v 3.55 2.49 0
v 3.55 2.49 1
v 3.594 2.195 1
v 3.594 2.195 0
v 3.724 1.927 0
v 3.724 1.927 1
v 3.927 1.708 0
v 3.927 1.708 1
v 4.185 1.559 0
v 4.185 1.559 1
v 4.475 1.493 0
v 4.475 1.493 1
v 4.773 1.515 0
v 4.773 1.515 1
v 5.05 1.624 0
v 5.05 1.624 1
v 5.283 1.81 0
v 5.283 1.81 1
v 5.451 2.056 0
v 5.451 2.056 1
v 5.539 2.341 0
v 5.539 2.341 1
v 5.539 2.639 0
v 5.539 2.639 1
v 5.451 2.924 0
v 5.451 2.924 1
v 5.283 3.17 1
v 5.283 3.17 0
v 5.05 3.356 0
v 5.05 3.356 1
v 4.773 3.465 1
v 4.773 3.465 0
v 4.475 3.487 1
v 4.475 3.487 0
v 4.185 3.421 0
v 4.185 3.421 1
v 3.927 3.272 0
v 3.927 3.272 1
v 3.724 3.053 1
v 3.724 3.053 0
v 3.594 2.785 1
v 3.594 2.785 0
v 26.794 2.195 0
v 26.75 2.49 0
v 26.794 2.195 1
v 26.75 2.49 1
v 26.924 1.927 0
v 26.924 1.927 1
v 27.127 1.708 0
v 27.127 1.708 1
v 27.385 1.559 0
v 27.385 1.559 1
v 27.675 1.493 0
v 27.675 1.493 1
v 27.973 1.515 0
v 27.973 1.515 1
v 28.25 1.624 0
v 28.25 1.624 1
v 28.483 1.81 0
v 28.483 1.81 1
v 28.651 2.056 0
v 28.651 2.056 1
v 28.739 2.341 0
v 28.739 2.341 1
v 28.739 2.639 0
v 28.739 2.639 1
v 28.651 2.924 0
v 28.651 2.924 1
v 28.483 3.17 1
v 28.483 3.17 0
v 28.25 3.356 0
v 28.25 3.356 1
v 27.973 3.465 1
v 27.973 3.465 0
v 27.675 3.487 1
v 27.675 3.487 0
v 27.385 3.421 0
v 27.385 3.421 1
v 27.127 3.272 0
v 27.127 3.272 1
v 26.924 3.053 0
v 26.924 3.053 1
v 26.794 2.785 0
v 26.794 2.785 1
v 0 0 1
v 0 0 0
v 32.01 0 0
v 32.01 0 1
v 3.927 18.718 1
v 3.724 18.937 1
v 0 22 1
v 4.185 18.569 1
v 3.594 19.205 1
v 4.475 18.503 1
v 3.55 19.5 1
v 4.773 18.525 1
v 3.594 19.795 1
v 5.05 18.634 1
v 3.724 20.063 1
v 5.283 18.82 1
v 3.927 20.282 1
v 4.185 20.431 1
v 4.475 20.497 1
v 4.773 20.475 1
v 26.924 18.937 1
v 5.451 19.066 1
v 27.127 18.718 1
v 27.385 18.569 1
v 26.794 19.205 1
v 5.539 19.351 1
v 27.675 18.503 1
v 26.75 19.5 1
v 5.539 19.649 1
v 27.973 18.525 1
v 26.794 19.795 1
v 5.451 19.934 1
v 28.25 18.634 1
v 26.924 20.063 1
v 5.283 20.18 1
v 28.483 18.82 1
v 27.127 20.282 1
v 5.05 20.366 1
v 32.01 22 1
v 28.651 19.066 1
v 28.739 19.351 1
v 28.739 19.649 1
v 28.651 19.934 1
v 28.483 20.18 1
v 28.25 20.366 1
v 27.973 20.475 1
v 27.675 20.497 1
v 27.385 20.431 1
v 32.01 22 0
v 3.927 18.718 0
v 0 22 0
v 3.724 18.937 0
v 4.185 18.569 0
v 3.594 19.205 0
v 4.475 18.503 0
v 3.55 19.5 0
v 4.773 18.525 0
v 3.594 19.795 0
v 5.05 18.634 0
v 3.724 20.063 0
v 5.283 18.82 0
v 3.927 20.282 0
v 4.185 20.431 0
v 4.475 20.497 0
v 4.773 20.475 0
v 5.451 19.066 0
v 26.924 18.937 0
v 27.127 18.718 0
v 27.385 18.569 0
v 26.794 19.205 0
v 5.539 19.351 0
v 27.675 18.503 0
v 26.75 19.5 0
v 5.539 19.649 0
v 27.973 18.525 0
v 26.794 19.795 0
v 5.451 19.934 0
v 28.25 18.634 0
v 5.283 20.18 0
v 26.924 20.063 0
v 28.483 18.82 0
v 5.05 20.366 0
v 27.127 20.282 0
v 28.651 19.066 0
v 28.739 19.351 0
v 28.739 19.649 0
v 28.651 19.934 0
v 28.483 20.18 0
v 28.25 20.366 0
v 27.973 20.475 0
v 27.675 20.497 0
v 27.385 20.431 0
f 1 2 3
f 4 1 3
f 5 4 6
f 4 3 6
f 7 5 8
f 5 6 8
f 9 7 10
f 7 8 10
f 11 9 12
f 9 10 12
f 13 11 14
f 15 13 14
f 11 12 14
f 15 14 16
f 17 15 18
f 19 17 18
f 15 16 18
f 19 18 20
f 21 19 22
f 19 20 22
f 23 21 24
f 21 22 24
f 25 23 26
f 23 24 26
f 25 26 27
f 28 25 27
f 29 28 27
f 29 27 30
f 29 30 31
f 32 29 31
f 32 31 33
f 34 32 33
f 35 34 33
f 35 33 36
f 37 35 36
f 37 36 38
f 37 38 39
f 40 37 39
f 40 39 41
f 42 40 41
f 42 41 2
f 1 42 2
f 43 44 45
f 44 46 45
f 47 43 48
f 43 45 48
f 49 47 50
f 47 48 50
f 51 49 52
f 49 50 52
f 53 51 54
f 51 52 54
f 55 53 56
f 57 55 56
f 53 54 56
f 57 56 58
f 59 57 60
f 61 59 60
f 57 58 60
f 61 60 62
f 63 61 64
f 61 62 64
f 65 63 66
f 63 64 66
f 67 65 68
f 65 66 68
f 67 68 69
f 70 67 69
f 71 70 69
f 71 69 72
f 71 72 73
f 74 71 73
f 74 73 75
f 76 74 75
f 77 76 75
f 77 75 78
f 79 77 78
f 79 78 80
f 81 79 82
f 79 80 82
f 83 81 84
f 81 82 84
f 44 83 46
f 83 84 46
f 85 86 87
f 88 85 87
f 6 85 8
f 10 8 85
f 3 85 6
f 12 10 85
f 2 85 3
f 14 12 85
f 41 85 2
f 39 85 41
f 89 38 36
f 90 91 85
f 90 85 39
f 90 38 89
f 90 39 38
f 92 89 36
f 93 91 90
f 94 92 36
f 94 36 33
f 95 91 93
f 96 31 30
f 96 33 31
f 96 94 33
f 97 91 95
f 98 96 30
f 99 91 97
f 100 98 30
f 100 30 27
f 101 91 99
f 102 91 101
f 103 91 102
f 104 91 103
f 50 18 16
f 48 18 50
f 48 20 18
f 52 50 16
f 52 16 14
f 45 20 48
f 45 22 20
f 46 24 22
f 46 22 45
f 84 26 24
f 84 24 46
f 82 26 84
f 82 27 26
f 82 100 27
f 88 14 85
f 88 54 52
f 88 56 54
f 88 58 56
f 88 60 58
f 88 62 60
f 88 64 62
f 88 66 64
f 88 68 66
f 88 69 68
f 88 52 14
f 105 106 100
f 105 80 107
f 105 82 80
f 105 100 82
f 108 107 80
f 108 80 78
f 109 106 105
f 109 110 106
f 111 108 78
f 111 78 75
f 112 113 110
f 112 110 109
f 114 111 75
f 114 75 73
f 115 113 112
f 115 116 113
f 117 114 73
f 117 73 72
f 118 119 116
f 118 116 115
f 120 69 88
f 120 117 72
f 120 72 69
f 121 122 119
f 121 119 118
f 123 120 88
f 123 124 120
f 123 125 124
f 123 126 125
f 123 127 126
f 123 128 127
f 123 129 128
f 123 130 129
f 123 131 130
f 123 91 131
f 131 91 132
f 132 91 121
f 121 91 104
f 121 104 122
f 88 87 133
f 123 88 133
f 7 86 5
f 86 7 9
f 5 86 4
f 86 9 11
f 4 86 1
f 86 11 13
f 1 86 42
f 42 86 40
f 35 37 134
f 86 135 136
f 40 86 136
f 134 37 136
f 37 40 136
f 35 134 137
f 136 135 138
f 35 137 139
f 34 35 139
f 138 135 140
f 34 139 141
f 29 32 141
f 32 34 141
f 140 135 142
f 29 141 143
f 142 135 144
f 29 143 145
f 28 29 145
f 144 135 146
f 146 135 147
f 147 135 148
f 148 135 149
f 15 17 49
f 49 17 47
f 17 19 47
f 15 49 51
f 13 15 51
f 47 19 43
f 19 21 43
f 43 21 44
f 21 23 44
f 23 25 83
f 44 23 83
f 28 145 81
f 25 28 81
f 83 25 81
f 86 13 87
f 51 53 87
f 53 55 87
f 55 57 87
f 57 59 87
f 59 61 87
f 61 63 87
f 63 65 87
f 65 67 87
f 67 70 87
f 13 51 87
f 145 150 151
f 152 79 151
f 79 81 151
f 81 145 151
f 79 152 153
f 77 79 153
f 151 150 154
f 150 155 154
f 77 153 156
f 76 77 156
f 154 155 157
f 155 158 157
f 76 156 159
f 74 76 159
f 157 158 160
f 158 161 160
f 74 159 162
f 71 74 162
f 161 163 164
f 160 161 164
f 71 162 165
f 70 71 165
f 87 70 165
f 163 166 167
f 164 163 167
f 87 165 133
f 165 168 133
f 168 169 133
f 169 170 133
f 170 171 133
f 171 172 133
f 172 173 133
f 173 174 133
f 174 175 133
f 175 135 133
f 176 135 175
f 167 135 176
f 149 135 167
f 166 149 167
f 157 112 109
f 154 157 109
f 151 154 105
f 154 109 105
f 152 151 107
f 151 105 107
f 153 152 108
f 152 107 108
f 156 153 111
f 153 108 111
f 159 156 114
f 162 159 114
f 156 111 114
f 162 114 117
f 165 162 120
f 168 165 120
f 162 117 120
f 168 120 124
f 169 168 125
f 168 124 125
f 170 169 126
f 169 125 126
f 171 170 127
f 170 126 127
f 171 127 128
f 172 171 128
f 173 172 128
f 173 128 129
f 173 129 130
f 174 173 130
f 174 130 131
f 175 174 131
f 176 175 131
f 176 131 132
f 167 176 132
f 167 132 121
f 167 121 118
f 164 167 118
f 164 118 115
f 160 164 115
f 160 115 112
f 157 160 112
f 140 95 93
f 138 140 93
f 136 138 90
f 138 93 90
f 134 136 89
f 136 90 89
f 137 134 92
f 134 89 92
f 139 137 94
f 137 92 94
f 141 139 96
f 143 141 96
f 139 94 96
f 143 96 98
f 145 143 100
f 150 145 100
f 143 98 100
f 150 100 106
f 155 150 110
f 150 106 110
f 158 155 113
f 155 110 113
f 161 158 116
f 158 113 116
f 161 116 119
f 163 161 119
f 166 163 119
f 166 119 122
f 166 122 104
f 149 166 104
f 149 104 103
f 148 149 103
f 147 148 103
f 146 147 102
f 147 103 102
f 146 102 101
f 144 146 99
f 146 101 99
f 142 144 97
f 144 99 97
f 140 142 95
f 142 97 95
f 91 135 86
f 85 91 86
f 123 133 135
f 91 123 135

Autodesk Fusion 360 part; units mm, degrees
sketch "Sketch1" plane through (0, 0, 0) normal (0, 0, 1) x (1, 0, 0)
  line L0 (0, 0) -> (32.01, 0)
  line L1 (32.01, 0) -> (32.01, 22)
  line L2 (32.01, 22) -> (0, 22)
  line L3 (0, 22) -> (0, 0)
  dimension "d1" = 32.01
  dimension "d2" = 22
extrude "Extrude1" add sketch "Sketch1" along normal blind 1
sketch "Sketch3" plane through (0, 0, 1) normal (0, 0, 1) x (-1, 0, 0)
  line L0 (0, -22) -> (0, 0)
  line L1 (0, 0) -> (-32.01, 0)
  line L2 (-32.01, 0) -> (-32.01, -22)
  line L3 (-32.01, -22) -> (0, -22)
  circle A0 centre (-4.55, -19.5) radius 1
  circle A1 centre (-27.75, -19.5) radius 1
  circle A2 centre (-4.55, -2.49) radius 1
  circle A3 centre (-27.75, -2.49) radius 1
  dimension "d5" = 2
  dimension "d6" = 2.5
  dimension "d7" = 4.55
  dimension "d10" = -23.2
  dimension "d11" = 17.01
extrude "Extrude2" cut sketch "Sketch3" against normal blind 1 contours A0 | A1 | A2 | A3
